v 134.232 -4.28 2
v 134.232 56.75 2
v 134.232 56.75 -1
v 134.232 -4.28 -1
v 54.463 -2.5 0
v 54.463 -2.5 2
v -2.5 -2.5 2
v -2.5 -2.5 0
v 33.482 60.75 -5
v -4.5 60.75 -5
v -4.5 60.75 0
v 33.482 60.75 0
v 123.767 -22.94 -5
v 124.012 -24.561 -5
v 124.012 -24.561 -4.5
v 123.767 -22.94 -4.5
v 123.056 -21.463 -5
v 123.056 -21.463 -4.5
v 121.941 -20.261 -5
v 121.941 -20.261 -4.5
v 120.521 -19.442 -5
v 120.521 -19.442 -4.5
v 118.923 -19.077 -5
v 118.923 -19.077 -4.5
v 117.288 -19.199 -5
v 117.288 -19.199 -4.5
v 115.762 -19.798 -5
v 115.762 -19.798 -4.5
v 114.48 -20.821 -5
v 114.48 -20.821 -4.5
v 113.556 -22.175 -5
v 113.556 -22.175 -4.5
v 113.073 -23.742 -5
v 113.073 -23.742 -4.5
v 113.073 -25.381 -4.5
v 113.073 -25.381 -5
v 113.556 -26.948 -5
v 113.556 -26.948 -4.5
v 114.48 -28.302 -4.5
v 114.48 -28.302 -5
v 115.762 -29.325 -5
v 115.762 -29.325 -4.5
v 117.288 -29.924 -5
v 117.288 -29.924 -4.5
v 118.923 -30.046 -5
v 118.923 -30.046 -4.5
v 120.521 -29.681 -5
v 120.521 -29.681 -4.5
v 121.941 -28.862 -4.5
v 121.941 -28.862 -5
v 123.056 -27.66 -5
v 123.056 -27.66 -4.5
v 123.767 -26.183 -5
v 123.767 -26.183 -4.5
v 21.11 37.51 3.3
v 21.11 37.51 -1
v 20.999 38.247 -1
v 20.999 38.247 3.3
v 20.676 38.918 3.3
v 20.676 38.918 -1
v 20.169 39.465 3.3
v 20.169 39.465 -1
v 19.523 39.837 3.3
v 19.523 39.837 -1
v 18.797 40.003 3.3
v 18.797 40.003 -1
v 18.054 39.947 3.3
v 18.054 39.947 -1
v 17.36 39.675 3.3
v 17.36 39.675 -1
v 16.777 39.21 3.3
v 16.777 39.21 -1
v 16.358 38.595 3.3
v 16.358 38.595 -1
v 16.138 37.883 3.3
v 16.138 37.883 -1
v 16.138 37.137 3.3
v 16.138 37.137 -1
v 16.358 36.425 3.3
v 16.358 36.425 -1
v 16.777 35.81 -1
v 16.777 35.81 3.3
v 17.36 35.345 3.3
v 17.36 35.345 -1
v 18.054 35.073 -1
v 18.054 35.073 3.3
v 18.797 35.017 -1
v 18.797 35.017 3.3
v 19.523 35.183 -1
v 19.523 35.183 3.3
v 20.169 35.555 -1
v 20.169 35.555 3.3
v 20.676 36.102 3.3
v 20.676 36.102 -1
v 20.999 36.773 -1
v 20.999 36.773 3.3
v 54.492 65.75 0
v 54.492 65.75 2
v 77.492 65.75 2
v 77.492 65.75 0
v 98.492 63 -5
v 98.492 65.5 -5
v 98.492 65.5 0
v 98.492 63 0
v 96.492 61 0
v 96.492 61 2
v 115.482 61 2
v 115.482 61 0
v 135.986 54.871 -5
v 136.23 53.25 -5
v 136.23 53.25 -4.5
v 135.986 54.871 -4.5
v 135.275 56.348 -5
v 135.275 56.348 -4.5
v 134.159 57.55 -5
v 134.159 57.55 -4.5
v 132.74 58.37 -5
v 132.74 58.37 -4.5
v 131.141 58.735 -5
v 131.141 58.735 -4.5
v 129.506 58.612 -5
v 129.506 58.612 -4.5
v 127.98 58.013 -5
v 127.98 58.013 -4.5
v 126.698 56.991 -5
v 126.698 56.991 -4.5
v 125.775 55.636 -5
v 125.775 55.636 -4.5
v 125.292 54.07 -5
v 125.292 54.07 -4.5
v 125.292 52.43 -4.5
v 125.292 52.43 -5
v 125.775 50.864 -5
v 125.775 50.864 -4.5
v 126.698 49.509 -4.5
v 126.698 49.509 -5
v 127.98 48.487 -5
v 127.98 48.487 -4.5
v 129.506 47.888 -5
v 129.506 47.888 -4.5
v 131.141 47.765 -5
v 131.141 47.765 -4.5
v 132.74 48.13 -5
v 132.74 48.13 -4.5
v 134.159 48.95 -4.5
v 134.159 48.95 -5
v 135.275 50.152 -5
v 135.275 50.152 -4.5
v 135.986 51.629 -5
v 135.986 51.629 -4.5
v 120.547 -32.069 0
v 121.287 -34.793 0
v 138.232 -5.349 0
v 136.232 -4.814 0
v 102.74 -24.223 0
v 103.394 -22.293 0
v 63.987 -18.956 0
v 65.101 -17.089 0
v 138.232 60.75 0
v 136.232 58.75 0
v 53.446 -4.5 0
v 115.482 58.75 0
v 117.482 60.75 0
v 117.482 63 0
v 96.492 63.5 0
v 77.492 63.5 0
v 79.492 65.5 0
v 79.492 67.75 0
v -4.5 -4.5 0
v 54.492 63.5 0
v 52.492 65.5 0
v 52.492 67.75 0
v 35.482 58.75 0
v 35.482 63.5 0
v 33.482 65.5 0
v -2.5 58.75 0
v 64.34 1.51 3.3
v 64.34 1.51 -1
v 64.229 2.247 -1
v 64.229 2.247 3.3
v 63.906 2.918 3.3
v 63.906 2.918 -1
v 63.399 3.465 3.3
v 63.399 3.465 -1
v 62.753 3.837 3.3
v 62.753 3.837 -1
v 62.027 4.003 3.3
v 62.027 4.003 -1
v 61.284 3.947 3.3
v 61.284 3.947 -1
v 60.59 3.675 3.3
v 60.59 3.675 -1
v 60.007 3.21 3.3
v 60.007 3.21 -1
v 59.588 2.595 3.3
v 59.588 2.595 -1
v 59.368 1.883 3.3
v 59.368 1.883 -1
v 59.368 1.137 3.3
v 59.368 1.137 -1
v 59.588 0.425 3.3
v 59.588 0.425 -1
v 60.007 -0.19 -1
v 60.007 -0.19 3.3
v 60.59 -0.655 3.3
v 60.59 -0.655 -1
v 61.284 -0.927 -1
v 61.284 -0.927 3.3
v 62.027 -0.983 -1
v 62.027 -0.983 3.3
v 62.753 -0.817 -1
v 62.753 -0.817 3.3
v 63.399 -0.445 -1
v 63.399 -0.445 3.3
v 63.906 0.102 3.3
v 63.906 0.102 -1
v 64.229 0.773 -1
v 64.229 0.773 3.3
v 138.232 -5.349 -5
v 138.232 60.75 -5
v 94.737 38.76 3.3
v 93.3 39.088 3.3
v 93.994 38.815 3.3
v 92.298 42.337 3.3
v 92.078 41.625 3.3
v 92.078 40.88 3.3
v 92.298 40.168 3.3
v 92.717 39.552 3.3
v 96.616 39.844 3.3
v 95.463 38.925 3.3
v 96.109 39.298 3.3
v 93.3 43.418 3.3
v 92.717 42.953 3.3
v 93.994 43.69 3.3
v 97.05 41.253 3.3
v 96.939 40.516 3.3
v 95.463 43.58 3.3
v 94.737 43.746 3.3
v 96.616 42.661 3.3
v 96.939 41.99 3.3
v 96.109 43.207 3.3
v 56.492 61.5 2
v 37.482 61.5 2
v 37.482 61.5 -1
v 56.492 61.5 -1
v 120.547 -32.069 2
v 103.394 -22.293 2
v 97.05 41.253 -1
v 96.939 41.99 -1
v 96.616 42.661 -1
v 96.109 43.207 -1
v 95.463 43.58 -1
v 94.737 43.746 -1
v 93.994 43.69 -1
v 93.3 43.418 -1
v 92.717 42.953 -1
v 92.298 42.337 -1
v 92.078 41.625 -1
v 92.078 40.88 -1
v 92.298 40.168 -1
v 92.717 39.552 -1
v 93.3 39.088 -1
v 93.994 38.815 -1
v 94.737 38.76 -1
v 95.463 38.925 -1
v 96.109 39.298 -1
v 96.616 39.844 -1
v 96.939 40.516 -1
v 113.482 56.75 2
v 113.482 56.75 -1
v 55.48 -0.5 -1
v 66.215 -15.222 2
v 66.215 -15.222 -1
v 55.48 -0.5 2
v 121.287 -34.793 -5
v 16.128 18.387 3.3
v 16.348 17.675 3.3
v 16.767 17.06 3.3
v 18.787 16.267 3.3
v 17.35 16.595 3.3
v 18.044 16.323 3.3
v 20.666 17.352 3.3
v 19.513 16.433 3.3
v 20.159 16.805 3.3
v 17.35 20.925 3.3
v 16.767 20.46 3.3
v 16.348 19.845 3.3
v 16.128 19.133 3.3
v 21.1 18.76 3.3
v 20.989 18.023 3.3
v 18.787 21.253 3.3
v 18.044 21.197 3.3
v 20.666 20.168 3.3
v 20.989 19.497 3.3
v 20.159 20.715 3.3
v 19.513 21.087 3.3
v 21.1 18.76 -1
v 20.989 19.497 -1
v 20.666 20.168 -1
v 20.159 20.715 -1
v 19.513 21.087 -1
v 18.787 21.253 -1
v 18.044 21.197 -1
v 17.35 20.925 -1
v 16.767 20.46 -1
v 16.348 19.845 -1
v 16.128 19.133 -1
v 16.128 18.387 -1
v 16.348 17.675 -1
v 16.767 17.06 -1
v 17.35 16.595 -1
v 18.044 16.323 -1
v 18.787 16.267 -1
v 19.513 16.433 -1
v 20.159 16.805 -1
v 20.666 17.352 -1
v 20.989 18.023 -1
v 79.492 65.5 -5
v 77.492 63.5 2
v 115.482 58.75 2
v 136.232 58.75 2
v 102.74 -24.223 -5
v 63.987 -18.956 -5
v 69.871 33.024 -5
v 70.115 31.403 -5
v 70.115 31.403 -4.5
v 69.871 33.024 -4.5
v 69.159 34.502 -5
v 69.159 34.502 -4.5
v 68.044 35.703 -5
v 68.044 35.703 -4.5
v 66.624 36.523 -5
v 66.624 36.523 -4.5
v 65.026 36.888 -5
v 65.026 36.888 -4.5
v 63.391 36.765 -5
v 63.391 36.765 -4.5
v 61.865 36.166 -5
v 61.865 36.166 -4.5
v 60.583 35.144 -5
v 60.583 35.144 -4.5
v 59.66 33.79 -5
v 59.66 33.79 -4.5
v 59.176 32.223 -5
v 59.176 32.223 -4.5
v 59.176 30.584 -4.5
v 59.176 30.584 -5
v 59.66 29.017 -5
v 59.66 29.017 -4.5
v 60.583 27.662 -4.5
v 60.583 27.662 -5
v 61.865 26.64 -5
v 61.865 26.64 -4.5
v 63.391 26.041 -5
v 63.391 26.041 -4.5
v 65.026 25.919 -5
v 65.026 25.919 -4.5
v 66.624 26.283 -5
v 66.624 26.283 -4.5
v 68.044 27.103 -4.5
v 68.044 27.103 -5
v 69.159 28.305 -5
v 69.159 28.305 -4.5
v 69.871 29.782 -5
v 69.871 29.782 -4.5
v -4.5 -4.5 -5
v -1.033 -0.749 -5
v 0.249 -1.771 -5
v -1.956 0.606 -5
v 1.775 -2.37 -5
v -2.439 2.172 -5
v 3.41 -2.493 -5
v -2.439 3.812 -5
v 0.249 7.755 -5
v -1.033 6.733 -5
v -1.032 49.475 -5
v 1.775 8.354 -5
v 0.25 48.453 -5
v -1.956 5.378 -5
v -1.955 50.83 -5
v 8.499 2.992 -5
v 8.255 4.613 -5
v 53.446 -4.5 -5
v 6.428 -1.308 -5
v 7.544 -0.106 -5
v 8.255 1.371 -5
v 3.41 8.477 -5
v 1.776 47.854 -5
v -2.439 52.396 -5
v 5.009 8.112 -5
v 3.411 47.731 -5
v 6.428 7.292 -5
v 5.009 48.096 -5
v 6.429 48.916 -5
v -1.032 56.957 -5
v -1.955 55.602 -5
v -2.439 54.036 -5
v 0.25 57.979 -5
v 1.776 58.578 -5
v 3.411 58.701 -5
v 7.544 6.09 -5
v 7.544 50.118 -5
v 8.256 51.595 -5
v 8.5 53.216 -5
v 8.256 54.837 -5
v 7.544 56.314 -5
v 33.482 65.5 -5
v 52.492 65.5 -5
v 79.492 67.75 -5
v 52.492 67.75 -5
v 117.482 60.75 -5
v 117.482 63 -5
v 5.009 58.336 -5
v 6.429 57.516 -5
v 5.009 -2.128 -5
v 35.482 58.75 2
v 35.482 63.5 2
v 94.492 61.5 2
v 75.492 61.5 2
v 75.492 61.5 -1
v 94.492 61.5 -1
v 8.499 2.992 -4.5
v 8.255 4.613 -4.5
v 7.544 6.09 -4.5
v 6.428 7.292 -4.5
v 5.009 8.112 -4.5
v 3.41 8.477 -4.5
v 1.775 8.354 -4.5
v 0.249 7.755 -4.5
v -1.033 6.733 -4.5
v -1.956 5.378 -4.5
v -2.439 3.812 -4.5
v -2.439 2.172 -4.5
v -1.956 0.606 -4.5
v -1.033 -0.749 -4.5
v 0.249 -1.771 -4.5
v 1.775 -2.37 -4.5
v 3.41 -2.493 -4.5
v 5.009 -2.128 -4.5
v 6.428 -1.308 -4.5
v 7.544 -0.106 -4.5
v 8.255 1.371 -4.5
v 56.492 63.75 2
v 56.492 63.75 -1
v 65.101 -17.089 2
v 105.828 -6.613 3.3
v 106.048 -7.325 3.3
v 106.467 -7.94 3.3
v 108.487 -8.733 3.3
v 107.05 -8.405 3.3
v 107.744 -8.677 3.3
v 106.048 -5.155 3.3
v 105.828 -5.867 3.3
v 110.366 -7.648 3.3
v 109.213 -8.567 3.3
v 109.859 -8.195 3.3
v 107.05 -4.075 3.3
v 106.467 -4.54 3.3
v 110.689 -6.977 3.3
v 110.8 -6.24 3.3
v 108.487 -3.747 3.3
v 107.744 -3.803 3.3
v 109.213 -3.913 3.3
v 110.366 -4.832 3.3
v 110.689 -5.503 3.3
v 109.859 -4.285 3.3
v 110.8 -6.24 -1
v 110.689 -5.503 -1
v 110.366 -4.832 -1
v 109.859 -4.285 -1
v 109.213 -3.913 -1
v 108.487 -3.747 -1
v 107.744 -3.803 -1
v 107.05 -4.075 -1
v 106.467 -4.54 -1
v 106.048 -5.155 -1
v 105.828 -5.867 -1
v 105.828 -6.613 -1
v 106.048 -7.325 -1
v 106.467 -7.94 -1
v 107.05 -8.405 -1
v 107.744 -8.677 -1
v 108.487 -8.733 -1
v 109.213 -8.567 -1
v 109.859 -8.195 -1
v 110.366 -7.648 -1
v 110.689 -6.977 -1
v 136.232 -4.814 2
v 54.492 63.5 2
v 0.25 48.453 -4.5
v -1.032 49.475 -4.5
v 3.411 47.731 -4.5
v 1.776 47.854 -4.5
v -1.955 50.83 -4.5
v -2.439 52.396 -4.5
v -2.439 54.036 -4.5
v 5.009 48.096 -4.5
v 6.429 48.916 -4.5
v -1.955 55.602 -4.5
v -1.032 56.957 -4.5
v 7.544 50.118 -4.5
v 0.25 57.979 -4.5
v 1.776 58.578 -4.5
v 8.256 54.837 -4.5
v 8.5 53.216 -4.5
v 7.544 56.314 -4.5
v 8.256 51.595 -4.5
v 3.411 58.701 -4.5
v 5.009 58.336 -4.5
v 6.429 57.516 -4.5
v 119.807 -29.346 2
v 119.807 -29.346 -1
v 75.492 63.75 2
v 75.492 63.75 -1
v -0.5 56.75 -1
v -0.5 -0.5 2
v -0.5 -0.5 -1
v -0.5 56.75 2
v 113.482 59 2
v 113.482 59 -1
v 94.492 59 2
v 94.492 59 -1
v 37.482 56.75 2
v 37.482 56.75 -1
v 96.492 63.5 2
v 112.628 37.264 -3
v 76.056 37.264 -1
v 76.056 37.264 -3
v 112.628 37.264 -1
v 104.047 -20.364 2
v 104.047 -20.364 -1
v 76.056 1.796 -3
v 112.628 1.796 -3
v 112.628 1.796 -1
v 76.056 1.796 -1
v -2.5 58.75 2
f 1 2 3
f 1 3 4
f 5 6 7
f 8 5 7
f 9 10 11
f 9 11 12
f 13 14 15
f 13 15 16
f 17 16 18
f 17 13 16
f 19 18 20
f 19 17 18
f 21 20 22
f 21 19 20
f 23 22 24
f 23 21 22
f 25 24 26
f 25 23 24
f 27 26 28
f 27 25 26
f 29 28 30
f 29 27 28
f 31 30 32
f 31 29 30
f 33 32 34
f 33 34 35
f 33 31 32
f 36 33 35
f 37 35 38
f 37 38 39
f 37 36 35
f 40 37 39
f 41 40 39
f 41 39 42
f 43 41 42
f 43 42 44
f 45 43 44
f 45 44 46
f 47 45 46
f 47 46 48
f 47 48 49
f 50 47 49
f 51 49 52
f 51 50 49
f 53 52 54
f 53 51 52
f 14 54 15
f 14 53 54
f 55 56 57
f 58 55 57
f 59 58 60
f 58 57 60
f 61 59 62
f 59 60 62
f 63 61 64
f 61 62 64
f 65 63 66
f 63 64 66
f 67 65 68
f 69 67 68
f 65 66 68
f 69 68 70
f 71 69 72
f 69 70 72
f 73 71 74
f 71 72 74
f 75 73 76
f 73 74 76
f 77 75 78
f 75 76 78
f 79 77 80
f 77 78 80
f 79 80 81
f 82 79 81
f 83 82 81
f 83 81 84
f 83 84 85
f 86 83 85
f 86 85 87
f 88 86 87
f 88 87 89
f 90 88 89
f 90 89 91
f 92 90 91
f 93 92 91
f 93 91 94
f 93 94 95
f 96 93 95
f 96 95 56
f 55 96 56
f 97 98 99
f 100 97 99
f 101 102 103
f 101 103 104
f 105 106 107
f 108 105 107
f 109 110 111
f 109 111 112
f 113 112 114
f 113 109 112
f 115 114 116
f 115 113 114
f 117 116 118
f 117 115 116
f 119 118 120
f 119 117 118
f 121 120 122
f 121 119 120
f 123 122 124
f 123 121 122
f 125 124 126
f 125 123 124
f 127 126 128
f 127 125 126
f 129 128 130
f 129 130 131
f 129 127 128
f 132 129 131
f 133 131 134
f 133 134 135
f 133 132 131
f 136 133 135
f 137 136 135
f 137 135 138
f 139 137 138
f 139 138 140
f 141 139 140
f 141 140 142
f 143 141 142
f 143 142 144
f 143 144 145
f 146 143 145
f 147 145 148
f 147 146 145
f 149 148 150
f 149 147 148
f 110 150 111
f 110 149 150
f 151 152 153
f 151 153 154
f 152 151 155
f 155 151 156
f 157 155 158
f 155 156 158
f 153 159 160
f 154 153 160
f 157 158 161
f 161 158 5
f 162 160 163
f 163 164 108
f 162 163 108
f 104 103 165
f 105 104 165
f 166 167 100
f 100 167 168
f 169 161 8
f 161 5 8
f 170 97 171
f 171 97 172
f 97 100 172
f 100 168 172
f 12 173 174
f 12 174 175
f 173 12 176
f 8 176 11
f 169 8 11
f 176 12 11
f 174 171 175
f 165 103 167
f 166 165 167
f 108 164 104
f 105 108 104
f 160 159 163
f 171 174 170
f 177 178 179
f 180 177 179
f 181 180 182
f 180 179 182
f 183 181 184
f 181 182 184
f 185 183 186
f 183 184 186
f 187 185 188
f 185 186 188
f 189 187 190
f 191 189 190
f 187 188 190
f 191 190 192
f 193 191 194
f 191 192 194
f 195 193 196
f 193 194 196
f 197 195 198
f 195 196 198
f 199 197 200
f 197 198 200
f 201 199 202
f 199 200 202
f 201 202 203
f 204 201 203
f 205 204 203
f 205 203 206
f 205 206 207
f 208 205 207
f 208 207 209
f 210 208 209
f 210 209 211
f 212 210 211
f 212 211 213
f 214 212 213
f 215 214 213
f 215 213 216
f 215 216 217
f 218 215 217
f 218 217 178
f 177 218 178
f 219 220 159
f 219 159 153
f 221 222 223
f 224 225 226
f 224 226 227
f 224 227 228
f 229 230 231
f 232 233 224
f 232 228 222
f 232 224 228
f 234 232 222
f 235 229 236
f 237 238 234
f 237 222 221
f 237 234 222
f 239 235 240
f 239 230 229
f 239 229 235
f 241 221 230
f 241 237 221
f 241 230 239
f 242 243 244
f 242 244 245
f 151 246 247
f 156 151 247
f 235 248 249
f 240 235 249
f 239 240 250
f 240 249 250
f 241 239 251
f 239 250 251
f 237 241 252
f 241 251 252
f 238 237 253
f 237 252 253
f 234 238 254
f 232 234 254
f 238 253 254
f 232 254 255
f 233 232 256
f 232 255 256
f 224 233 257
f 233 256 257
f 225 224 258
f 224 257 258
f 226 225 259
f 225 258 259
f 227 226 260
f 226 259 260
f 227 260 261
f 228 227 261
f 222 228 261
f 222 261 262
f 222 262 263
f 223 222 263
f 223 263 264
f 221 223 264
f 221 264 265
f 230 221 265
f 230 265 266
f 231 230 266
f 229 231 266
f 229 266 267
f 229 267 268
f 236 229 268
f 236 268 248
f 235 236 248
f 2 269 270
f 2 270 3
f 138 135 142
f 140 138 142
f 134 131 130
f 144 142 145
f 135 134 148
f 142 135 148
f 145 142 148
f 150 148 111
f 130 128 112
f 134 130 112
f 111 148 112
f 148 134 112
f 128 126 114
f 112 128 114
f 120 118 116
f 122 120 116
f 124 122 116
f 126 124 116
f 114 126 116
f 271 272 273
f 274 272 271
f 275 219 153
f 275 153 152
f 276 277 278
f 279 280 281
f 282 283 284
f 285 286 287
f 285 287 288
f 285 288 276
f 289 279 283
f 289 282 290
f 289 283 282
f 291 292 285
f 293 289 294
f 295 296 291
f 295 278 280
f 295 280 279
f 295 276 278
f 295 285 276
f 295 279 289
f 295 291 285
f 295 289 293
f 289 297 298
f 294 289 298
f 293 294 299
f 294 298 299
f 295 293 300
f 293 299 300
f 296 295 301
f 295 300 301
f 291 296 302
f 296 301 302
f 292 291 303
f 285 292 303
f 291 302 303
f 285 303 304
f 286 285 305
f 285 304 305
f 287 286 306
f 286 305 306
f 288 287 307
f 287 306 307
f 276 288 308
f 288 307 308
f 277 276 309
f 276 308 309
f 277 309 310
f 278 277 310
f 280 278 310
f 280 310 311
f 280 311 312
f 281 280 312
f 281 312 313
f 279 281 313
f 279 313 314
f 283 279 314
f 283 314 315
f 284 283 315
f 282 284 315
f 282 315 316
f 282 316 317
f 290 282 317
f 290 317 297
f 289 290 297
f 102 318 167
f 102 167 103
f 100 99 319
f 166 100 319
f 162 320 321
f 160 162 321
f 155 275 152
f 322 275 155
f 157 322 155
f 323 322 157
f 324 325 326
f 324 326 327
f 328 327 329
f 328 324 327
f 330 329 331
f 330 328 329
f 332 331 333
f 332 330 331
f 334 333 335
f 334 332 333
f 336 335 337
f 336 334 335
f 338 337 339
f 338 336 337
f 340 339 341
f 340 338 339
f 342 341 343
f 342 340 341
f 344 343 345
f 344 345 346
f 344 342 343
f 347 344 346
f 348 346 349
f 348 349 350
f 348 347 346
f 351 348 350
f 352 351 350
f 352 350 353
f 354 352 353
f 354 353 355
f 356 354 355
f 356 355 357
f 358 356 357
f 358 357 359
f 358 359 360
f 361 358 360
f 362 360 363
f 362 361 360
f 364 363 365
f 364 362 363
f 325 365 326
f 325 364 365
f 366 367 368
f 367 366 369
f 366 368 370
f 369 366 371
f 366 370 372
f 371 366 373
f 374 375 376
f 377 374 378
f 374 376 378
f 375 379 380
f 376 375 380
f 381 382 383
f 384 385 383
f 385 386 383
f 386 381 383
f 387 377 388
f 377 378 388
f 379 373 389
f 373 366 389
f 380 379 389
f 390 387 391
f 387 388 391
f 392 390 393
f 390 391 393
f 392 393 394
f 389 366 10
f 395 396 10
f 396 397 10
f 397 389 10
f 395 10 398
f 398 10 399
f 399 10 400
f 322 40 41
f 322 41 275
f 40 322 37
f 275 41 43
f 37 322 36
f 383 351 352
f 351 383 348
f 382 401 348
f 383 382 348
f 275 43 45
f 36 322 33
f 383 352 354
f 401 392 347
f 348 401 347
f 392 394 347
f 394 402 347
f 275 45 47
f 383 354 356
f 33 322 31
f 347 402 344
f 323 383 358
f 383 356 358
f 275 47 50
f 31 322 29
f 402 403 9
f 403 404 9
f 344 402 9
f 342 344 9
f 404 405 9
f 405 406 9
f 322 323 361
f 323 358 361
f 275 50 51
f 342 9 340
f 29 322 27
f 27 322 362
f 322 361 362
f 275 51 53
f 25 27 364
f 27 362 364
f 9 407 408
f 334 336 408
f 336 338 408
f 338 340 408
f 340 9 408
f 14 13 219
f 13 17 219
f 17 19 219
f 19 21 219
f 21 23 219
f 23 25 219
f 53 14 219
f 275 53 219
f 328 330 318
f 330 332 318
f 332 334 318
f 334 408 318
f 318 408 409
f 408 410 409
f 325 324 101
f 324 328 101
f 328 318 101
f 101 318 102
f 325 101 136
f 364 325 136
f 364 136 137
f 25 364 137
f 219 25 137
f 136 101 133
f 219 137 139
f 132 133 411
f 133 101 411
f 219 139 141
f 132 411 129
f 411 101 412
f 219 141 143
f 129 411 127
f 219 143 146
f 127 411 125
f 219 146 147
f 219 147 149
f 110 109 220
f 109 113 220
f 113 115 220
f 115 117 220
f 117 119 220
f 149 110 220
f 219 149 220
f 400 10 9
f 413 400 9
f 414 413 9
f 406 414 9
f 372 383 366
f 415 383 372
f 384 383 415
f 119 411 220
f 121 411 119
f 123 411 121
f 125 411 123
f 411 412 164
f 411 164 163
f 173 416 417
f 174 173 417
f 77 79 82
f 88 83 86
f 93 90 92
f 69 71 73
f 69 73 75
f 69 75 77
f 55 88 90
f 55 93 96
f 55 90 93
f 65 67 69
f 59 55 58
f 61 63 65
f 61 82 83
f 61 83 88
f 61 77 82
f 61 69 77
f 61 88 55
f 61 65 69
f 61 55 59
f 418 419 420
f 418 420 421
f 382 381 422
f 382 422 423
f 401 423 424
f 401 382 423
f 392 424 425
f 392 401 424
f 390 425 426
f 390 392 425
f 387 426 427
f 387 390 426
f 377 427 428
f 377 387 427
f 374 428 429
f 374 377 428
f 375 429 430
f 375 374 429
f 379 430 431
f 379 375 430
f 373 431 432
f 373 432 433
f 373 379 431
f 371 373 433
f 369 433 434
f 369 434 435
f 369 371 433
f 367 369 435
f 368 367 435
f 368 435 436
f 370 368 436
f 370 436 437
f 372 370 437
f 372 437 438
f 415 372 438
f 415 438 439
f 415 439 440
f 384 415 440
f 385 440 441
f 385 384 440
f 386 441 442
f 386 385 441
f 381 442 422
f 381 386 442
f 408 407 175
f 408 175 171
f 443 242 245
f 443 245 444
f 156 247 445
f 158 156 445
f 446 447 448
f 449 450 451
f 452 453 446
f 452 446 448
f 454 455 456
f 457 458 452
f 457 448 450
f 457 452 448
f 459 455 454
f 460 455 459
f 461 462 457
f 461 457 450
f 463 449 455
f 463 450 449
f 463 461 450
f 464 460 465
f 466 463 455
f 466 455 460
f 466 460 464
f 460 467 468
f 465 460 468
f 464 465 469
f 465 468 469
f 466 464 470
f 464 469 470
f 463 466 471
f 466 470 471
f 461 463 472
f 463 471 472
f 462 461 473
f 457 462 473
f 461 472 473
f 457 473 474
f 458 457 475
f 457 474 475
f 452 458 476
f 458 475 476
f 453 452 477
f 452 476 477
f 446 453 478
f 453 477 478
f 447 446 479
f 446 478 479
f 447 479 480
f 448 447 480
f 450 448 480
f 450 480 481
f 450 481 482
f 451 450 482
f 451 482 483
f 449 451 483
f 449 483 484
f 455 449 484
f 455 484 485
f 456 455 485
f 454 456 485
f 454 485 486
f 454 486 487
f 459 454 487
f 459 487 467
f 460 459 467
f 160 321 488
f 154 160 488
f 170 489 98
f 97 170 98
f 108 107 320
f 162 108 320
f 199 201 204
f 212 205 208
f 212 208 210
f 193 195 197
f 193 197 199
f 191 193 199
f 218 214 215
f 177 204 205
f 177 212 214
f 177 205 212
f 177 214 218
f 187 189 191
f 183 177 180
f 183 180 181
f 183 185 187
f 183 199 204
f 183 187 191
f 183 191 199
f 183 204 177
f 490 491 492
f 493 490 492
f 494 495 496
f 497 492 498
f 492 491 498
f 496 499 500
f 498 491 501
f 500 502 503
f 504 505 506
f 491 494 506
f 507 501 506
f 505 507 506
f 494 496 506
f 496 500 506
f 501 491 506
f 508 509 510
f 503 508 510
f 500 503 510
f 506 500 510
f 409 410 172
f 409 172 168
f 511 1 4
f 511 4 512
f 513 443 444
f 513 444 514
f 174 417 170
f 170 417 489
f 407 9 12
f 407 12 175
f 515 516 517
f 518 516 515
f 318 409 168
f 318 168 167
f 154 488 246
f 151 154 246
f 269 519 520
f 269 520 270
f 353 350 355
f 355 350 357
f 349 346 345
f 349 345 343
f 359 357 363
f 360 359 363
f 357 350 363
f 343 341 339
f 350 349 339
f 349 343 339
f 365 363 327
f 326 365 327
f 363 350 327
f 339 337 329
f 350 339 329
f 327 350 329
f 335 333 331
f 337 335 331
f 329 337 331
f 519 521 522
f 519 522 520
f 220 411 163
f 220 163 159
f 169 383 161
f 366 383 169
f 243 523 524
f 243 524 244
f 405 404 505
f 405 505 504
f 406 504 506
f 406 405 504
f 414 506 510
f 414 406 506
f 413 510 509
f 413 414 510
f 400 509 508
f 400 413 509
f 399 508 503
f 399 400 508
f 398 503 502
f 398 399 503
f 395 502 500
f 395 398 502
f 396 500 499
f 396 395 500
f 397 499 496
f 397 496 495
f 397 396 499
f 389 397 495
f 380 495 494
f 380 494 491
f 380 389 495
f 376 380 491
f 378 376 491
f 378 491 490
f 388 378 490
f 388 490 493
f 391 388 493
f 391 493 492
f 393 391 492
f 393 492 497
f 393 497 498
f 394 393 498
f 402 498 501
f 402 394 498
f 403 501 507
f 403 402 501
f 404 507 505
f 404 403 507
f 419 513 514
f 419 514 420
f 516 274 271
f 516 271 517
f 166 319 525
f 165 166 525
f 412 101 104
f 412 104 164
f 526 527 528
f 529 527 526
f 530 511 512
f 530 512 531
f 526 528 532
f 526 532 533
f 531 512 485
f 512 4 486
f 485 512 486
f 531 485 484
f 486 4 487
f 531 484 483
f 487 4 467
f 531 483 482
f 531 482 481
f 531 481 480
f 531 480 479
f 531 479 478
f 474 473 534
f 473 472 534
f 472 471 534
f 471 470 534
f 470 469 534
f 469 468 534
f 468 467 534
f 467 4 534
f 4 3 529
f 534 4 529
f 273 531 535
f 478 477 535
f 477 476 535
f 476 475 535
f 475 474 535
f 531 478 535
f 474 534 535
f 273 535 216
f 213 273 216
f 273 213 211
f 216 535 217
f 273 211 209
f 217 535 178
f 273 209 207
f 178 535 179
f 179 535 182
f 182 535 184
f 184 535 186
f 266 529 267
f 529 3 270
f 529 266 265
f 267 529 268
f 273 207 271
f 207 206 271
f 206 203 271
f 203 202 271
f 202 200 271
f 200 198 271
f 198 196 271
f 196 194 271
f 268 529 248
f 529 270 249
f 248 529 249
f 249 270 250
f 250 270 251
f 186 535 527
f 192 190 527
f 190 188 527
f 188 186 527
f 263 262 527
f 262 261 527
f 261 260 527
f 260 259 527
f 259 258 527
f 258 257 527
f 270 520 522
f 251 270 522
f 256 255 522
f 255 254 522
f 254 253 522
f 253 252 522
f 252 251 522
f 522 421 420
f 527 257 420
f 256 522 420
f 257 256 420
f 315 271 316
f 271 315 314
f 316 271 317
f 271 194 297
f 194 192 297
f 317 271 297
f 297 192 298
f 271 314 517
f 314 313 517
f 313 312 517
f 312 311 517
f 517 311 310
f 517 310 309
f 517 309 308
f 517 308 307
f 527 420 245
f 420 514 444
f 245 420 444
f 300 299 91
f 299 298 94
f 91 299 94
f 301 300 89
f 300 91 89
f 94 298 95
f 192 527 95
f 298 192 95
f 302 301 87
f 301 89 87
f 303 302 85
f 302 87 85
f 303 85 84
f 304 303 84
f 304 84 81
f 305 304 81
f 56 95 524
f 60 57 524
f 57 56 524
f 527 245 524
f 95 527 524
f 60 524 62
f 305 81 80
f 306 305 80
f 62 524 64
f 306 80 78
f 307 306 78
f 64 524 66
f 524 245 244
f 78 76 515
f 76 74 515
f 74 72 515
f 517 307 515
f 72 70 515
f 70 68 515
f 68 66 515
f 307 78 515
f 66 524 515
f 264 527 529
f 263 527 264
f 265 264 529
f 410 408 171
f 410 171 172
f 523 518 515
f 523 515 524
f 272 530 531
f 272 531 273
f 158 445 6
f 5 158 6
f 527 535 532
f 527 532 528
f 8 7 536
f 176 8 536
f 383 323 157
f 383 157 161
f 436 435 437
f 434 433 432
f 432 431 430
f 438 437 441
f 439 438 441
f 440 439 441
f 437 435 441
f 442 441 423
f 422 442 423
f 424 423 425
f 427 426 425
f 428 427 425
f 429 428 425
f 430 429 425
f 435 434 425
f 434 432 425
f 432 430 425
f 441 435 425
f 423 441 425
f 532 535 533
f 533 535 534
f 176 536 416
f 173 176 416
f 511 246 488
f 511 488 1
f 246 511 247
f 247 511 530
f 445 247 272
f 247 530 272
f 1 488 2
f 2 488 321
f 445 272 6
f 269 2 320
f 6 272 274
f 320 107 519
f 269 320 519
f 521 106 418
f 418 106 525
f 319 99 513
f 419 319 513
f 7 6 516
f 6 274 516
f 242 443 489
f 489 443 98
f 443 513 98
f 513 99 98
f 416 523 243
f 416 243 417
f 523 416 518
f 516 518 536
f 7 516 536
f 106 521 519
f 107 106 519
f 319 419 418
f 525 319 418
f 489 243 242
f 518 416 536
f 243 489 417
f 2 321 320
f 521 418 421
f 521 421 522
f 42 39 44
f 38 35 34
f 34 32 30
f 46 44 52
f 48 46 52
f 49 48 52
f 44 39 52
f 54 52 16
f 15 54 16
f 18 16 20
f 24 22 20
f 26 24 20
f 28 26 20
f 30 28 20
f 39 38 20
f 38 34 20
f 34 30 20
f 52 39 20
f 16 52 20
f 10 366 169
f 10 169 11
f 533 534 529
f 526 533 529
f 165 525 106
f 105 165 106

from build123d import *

# Parameters (mm, degrees)
PAD008_DEPTH        = 7
POCKET016_DEPTH     = 4
MIRROREDSKETCH012_R = 2.5
PAD009_DEPTH        = 8.3
POCKET017_DEPTH     = 2
MIRROREDSKETCH015_R = 5.5
POCKET019_DEPTH     = 0.5
SKETCH024_W         = 36.571793
SKETCH024_H         = 35.468334
POCKET022_DEPTH     = 2


with BuildPart() as part:
    # MirroredSketch010 → Pad008 (new body)
    with BuildSketch(Plane.XY.offset(-1)):
        Polygon((-4.5, 60.749919), (33.482443, 60.749919), (33.482443, 65.499919), (52.492443, 65.499919), (52.492443, 67.749919), (79.492443, 67.749919), (79.492443, 65.499919), (98.492443, 65.499919), (98.492443, 62.999919), (117.482443, 62.999919), (117.482443, 60.749919), (138.232443, 60.749919), (138.232443, -5.348885), (121.287497, -34.793261), (102.74032, -24.222717), (63.98748, -18.955575), (53.446293, -4.5), (-4.5, -4.5), align=None)
    extrude(amount=PAD008_DEPTH)

    # MirroredSketch011 → Pocket016 (cut)
    with BuildSketch(Plane.XY.offset(7)):
        Polygon((-0.5, -0.5), (-0.5, 56.75), (37.482443, 56.75), (37.482443, 61.499919), (56.492443, 61.499919), (56.492443, 63.749919), (75.492443, 63.749919), (75.492443, 61.499919), (94.492443, 61.499919), (94.492443, 58.999919), (113.482443, 58.999919), (113.482443, 56.749919), (134.232443, 56.749919), (134.232443, -4.280081), (119.807428, -29.345701), (104.047316, -20.363581), (66.215158, -15.221576), (55.48, -0.5), align=None)
    extrude(amount=-POCKET016_DEPTH, mode=Mode.SUBTRACT)

    # MirroredSketch012 → Pad009 (join)
    with BuildSketch(Plane.XY.offset(-1)):
        with Locations((18.61, 37.509997)):
            Circle(MIRROREDSKETCH012_R)
        with Locations((18.6, 18.76)):
            Circle(MIRROREDSKETCH012_R)
        with Locations((94.55, 41.252659)):
            Circle(MIRROREDSKETCH012_R)
        with Locations((61.84, 1.51)):
            Circle(MIRROREDSKETCH012_R)
        with Locations((108.3, -6.24)):
            Circle(MIRROREDSKETCH012_R)
    extrude(amount=PAD009_DEPTH)

    # MirroredSketch014 → Pocket017 (cut)
    with BuildSketch(Plane.XY.offset(6)):
        Polygon((-4.5, 60.749919), (33.482443, 60.749919), (33.482443, 65.499919), (52.492443, 65.499919), (52.492443, 67.749919), (79.492443, 67.749919), (79.492443, 65.499919), (98.492443, 65.499919), (98.492443, 62.999919), (117.482443, 62.999919), (117.482443, 60.749919), (138.232443, 60.749919), (138.232443, -5.348885), (121.287497, -34.793261), (102.74032, -24.222717), (63.98748, -18.955575), (53.446293, -4.5), (-4.5, -4.5), align=None)
        Polygon((-2.5, 58.75), (35.482443, 58.75), (35.482443, 63.499919), (54.492443, 63.499919), (54.492443, 65.749919), (77.492443, 65.749919), (77.492443, 63.499919), (96.492443, 63.499919), (96.492443, 60.999919), (115.482443, 60.999919), (115.482443, 58.749919), (136.232443, 58.749919), (136.232443, -4.814483), (120.547462, -32.069481), (103.393818, -22.293149), (65.101319, -17.088576), (54.463147, -2.5), (-2.5, -2.5), align=None, mode=Mode.SUBTRACT)
    extrude(amount=-POCKET017_DEPTH, mode=Mode.SUBTRACT)

    # MirroredSketch015 → Pocket019 (cut)
    with BuildSketch(Plane.XY.offset(-1)):
        with Locations((2.999251, 2.991994)):
            Circle(MIRROREDSKETCH015_R)
        with Locations((3, 53.216069)):
            Circle(MIRROREDSKETCH015_R)
        with Locations((130.730277, 53.25)):
            Circle(MIRROREDSKETCH015_R)
        with Locations((118.51162, -24.561471)):
            Circle(MIRROREDSKETCH015_R)
        with Locations((64.615, 31.403258)):
            Circle(MIRROREDSKETCH015_R)
    extrude(amount=POCKET019_DEPTH, mode=Mode.SUBTRACT)

    # Sketch024 → Pocket022 (cut)
    with BuildSketch(Plane.XY.offset(3)):
        with Locations((94.342338, 19.530172)):
            Rectangle(SKETCH024_W, SKETCH024_H)
    extrude(amount=-POCKET022_DEPTH, mode=Mode.SUBTRACT)


with BuildPart() as part_1:
    # Body008 placement: moved
    add(part.part.moved(Location((0, 0, -4))))


solid = part_1.part
